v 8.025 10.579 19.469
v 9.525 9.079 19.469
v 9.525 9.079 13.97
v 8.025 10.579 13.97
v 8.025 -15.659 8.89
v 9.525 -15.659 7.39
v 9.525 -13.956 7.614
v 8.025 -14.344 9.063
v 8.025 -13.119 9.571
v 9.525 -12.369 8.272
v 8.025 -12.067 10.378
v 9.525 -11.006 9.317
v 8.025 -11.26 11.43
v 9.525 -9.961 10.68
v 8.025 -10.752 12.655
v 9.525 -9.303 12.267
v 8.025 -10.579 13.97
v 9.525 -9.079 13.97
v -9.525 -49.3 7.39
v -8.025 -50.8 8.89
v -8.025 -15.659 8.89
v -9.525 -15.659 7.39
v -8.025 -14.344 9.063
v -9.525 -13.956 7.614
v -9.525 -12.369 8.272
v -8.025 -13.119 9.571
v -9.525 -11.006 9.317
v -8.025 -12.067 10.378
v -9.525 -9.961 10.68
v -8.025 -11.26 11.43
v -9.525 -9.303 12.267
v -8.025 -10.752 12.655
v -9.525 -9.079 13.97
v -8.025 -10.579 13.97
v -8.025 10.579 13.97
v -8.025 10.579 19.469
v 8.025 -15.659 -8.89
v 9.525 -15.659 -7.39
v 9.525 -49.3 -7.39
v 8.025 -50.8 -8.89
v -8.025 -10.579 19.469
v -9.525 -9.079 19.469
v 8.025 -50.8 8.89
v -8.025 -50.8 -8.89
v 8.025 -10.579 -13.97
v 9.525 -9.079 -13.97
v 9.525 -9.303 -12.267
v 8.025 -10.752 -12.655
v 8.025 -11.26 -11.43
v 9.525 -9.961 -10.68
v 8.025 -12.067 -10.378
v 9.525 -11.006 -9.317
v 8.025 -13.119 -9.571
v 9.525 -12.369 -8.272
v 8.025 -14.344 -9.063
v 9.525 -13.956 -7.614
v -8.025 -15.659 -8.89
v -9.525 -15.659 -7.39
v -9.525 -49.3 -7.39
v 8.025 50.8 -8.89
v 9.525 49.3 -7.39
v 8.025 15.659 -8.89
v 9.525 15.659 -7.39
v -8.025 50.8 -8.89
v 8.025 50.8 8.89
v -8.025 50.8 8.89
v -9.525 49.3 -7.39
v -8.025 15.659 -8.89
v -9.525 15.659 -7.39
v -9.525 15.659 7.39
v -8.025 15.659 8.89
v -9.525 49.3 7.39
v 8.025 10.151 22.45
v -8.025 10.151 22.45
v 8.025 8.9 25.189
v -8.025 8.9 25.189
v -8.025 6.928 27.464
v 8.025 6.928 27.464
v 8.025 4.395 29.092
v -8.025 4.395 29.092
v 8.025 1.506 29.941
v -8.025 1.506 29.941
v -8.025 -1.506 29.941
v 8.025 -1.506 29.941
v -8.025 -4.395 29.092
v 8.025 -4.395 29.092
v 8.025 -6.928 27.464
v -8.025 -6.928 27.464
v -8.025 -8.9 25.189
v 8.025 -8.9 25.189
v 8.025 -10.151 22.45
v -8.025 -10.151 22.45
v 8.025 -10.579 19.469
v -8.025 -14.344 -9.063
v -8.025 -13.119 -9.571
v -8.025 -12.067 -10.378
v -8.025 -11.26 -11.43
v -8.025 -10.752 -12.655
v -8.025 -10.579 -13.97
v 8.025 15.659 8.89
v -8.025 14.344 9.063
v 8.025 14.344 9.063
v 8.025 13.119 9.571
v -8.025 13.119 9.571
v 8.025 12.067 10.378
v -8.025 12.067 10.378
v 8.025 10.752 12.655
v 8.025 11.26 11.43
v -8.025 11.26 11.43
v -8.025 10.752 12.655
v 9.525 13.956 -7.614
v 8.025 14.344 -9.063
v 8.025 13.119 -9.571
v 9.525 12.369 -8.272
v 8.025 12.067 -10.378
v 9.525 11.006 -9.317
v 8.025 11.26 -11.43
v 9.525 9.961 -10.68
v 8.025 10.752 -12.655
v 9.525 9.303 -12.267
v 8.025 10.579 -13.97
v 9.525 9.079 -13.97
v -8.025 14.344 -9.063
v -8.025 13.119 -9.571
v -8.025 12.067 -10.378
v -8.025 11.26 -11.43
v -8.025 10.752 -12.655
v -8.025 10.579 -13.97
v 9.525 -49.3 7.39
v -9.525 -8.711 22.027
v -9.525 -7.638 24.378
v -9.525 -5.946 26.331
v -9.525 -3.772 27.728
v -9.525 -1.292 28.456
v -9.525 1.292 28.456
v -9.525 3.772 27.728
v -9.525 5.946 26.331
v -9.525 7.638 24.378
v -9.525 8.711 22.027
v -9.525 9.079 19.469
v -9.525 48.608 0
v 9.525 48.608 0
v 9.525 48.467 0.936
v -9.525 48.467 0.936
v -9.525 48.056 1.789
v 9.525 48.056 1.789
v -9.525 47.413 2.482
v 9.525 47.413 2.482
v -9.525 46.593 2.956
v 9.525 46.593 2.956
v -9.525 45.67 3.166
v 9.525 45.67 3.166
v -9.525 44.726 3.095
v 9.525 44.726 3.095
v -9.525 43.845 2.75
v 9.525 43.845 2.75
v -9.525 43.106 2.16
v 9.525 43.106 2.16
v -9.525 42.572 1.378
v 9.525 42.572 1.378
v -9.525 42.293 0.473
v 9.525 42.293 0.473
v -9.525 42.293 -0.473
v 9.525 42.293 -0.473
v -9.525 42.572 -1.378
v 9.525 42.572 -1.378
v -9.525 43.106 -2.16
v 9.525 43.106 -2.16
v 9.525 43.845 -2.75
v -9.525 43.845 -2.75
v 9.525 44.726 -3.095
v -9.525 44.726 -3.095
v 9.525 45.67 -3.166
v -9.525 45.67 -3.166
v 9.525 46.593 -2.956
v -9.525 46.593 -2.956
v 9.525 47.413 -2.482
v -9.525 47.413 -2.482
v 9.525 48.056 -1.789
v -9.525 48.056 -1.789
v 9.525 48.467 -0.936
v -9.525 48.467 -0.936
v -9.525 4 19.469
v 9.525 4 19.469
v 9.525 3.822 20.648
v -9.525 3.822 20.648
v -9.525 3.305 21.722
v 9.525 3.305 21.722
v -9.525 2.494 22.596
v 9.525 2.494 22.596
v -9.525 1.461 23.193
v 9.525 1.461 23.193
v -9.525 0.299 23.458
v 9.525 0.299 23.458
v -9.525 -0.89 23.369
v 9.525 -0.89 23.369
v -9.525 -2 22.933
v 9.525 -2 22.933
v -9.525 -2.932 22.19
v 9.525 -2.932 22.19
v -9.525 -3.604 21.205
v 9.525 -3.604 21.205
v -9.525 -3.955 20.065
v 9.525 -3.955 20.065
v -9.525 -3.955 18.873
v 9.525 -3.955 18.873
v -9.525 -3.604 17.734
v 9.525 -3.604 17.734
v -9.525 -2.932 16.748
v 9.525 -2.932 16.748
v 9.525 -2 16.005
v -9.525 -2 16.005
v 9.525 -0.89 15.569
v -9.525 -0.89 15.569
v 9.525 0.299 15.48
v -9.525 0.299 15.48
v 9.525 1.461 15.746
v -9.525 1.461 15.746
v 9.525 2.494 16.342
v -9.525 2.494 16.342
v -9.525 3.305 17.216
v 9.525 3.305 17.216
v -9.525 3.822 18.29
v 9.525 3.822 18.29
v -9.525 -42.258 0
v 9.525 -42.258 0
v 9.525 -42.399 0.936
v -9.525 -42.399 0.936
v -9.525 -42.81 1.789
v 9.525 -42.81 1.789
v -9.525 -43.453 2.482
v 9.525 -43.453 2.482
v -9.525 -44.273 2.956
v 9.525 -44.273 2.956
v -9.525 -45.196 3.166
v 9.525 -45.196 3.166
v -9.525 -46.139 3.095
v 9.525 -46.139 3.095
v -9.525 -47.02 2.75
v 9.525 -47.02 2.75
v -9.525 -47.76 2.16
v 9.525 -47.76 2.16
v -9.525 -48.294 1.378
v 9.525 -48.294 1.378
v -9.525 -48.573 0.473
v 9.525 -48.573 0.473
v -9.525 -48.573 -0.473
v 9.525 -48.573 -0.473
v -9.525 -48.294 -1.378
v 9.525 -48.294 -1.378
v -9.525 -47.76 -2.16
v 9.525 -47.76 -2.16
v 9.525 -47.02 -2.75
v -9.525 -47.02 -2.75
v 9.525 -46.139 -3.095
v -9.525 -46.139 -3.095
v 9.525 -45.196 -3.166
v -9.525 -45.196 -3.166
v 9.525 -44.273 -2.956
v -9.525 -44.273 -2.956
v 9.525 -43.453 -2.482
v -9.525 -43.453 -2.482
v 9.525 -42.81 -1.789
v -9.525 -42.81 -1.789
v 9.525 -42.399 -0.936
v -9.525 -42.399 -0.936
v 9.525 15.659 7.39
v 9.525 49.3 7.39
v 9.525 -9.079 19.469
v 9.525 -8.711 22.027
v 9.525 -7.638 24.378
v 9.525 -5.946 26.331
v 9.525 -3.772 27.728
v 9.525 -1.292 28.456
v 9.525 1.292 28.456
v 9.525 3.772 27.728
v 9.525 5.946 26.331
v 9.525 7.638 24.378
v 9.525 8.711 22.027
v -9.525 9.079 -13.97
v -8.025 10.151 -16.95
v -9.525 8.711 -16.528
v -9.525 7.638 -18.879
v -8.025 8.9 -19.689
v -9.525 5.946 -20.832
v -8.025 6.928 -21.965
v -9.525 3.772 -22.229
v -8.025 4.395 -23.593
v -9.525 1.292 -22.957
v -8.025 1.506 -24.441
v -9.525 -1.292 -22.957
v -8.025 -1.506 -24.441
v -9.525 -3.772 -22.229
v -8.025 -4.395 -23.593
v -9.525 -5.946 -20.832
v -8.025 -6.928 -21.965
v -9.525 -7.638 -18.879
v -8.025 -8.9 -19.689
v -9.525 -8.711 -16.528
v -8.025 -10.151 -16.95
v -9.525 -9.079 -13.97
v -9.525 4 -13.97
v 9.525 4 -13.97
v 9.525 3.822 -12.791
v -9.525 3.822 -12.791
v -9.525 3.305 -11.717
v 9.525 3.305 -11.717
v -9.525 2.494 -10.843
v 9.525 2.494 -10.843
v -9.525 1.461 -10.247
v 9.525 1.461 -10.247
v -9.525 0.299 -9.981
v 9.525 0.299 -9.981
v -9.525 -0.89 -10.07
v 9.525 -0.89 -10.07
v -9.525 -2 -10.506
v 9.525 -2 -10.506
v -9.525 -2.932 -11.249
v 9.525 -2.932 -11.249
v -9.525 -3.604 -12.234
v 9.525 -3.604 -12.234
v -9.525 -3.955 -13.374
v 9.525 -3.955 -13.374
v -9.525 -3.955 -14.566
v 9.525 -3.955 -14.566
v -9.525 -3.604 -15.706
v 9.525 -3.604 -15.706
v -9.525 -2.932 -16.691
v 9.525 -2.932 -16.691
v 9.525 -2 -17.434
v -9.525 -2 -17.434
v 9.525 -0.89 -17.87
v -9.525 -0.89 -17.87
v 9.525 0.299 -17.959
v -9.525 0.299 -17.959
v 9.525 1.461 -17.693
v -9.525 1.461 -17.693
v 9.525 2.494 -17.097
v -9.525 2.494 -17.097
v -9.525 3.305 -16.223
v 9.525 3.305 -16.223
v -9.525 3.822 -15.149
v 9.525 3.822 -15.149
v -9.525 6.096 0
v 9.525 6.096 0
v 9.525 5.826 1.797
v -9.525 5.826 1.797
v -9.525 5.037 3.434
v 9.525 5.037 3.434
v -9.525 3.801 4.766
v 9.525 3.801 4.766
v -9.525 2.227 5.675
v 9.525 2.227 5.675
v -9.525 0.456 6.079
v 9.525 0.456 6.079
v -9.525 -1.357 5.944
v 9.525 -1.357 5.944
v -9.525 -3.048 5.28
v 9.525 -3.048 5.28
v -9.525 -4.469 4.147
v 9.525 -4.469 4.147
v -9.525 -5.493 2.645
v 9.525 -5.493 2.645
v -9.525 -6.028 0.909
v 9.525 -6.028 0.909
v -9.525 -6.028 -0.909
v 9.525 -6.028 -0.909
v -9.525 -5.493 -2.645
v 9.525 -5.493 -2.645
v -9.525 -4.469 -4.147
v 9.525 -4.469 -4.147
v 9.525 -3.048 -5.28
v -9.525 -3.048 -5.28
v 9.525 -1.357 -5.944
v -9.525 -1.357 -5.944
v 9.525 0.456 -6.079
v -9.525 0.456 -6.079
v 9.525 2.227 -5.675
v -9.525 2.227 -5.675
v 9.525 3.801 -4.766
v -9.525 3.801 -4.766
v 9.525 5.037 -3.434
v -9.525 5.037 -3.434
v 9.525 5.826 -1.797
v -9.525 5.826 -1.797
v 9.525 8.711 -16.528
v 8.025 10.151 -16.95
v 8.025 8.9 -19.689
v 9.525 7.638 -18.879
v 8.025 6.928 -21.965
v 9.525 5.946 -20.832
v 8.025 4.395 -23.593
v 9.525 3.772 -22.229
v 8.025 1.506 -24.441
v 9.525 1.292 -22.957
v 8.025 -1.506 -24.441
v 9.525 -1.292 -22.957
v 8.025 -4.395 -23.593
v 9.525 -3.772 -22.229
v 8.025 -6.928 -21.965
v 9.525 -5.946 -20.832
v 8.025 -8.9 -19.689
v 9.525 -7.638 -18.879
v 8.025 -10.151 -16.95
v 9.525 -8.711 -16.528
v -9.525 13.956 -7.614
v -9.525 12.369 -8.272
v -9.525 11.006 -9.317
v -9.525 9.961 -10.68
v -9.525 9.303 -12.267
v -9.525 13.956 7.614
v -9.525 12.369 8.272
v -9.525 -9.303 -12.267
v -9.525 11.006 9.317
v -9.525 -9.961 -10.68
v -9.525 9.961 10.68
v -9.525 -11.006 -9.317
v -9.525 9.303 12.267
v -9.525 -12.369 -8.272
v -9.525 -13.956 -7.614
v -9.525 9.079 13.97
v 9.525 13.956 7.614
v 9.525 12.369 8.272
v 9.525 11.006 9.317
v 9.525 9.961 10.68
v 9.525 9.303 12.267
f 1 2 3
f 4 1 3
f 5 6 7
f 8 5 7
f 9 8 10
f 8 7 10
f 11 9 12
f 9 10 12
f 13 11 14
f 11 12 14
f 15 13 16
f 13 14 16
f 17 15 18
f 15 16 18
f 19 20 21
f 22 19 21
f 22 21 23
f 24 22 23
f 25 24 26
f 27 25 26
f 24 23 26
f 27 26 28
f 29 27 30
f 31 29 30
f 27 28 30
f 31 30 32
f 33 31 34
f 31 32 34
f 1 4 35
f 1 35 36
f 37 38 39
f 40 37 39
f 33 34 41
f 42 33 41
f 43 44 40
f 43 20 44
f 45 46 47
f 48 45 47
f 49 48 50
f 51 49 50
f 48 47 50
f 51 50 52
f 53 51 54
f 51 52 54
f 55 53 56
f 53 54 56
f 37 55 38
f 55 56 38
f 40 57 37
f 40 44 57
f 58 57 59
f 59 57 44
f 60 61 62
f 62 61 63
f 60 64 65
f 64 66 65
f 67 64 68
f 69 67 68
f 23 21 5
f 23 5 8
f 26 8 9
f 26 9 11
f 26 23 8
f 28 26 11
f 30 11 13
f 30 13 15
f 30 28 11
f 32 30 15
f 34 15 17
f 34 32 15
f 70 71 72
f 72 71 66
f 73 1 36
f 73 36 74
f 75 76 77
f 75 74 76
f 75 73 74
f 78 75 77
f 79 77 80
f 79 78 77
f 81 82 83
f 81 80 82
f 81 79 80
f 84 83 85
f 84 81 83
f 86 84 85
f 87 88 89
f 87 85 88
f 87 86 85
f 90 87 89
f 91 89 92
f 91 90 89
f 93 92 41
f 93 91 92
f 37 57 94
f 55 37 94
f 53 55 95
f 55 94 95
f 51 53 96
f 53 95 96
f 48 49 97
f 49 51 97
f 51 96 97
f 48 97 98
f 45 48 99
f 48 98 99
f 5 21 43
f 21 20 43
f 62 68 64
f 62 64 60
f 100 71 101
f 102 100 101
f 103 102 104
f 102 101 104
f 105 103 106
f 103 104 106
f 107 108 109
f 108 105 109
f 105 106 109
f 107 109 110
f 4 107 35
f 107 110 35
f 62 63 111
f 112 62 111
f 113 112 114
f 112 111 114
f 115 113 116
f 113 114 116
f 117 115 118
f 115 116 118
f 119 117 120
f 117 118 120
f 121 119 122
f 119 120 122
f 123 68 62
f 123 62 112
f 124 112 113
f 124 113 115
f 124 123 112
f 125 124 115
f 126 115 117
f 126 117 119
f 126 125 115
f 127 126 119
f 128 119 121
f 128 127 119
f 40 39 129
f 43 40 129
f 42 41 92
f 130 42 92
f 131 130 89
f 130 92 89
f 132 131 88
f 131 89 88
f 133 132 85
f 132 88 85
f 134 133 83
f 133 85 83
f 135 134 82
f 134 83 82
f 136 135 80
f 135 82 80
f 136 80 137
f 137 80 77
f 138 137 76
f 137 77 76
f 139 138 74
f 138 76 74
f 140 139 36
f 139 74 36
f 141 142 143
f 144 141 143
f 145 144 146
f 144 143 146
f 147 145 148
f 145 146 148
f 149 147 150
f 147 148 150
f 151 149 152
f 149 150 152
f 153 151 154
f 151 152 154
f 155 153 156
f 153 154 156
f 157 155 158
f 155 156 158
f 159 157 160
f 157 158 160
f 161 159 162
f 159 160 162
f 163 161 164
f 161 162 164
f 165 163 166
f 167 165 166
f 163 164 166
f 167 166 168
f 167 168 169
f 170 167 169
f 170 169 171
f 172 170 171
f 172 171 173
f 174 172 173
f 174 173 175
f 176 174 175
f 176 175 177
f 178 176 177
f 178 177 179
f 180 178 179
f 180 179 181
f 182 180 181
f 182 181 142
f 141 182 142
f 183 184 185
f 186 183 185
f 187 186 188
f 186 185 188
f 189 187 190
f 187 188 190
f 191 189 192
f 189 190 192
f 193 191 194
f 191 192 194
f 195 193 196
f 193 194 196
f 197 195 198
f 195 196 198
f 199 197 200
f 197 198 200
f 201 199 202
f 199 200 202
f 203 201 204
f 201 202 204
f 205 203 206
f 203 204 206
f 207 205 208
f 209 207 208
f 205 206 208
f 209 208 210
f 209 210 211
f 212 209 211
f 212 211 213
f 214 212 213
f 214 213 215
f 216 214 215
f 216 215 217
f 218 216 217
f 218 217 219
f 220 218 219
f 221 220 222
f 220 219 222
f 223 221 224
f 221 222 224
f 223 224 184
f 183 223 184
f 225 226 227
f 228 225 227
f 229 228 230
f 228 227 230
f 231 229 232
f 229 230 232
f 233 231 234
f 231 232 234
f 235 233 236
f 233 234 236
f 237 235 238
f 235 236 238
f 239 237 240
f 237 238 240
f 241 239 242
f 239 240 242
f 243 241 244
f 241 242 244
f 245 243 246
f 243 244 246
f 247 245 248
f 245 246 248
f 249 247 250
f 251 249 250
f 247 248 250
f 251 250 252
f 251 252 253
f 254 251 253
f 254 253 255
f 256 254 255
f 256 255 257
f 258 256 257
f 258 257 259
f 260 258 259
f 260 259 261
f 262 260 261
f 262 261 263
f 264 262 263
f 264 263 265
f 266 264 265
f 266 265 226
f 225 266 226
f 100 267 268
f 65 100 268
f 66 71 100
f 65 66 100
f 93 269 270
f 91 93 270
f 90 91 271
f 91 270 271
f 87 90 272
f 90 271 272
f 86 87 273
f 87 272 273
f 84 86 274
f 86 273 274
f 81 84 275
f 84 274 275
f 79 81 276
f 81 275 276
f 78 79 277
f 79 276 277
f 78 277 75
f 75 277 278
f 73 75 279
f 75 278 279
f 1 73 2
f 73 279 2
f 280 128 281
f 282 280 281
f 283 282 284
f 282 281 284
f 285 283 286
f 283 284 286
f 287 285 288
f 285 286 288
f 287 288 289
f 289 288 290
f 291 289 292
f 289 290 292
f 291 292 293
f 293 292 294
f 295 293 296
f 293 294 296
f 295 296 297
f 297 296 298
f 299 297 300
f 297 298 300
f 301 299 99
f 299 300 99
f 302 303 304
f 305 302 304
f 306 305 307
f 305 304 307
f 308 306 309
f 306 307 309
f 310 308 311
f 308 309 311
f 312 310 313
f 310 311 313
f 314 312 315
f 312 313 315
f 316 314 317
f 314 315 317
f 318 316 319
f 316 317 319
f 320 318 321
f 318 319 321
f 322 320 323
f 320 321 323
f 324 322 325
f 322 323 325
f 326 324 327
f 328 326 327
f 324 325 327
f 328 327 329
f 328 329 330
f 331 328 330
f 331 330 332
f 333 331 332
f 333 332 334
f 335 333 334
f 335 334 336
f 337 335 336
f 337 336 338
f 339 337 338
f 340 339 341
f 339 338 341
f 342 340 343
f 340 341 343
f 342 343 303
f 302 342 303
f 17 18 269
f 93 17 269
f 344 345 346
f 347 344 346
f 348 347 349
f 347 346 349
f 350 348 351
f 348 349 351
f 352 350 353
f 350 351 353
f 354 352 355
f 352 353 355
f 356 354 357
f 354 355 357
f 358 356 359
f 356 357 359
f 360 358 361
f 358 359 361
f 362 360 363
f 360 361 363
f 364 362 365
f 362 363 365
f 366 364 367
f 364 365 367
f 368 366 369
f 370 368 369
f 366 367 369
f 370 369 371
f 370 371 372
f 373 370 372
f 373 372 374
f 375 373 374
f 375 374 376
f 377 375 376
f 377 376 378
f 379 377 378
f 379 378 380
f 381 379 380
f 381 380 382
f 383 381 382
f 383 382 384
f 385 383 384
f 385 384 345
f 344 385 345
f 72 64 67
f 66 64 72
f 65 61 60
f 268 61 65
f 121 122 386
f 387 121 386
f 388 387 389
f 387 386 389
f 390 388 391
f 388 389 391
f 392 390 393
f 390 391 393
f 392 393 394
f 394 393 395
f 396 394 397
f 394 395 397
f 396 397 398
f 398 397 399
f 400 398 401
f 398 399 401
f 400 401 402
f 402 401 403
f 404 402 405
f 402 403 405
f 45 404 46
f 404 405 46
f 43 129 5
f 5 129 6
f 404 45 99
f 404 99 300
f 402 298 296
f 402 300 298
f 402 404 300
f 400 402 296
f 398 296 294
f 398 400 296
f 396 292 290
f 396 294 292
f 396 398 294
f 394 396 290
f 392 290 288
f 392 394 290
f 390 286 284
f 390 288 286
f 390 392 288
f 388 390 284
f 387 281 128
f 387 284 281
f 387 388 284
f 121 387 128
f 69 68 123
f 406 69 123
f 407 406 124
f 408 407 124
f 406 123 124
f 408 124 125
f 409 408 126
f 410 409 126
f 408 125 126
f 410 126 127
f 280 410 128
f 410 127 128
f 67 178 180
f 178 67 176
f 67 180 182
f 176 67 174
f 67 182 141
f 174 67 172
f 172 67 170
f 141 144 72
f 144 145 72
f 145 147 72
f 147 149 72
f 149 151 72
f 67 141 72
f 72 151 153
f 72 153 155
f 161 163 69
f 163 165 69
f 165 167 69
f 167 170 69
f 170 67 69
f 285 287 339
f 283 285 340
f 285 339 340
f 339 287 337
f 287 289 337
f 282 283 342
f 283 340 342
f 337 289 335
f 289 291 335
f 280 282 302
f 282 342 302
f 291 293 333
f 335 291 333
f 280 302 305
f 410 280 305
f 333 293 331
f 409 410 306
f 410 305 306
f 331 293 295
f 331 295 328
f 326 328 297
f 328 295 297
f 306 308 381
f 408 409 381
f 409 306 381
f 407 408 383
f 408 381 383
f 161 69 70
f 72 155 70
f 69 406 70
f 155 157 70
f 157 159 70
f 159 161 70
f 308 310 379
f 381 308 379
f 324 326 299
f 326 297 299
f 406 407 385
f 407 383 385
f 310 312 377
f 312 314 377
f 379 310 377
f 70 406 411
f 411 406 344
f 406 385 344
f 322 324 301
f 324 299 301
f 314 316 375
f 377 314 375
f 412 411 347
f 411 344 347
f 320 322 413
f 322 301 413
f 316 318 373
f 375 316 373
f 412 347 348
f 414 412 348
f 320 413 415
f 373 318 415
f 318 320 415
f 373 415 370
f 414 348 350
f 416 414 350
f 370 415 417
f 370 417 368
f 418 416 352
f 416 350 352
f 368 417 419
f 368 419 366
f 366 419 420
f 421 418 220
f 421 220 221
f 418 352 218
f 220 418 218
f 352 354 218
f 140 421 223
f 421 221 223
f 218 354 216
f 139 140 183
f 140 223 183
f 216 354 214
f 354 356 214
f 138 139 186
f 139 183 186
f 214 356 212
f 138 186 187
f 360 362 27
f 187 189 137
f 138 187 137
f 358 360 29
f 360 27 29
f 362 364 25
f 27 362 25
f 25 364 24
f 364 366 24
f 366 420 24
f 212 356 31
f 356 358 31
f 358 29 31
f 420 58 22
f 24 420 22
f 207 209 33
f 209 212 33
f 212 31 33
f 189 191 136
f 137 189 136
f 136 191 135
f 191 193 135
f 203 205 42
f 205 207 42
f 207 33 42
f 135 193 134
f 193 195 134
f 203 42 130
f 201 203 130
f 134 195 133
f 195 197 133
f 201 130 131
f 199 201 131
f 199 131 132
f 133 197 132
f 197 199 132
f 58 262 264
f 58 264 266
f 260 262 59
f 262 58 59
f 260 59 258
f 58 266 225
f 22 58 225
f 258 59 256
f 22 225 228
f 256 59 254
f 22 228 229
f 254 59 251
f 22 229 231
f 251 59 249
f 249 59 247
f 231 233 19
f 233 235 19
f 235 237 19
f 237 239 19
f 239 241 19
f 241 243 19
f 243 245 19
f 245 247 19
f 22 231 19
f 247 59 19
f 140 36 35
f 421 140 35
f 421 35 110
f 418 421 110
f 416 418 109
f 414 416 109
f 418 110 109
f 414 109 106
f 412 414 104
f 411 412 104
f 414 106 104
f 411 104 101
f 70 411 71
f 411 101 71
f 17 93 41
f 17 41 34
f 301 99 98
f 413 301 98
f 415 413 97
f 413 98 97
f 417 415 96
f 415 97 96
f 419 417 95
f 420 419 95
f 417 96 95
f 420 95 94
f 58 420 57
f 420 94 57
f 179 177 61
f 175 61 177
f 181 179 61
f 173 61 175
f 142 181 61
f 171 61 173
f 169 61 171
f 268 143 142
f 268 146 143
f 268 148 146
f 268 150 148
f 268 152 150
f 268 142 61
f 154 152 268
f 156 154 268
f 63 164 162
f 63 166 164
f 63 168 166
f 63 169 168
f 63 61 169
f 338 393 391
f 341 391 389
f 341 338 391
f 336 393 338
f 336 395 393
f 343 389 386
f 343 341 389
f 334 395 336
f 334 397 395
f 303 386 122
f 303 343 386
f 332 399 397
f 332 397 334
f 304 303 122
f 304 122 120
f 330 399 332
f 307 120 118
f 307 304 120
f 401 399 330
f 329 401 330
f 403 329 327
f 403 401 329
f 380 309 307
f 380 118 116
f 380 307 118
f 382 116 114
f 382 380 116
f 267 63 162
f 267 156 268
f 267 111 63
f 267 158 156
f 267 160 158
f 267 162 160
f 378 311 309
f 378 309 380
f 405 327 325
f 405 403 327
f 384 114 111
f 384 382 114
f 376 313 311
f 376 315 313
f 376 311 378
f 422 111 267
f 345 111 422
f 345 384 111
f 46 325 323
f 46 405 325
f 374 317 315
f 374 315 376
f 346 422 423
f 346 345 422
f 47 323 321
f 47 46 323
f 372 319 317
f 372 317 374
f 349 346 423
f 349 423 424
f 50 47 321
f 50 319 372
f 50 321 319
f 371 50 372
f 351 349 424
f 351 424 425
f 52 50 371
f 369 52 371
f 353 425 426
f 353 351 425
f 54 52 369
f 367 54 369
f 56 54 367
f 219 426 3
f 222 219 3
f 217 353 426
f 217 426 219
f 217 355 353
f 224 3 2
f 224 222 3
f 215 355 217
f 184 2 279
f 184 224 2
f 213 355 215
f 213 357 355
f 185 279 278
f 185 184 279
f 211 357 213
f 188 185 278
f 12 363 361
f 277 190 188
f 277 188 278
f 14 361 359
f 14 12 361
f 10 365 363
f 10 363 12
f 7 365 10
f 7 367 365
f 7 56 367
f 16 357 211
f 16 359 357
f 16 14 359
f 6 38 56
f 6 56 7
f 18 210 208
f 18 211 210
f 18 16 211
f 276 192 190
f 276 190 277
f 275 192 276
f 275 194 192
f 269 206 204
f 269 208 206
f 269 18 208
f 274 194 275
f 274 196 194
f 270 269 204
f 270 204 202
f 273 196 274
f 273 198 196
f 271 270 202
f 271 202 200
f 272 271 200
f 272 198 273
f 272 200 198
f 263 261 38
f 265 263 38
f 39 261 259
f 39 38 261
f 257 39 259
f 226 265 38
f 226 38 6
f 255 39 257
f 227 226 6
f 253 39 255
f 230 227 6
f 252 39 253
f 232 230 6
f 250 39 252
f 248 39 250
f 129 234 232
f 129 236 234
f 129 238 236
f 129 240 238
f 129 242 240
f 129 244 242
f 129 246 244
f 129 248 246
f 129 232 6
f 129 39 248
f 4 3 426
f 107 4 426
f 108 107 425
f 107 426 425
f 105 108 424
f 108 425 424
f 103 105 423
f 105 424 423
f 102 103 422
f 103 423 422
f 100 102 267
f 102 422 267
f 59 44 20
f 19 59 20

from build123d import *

# Parameters (mm, degrees)
F0_W     = 19.05
F0_H     = 17.78
F1_DEPTH = 50.8
F2_R     = 3.175
F2_R_2   = 6.0964456607
F3_DEPTH = 19.051
F4_R     = 4
F5_DEPTH = 19.05
F6_R     = 5.07999
F7_SIZE  = 1.5


# Not quite as in the source:
# - a fillet or chamfer is up to 0.001 mm smaller than in the source, because OpenCascade refuses the exact size


with BuildPart() as f1:
    # F0 (on Front) → F1 (new body, symmetric)
    with BuildSketch(Plane.XZ):
        Rectangle(F0_W, F0_H)
    extrude(amount=F1_DEPTH, both=True)

    # F2 (on face) → F3 (cut, through all)
    with BuildSketch(Plane.YZ.offset(9.525)):
        with Locations((-45.43298, 0)):
            Circle(F2_R)
        with Locations((45.43298, 0)):
            Circle(F2_R)
        Circle(F2_R_2)
    extrude(amount=-F3_DEPTH, mode=Mode.SUBTRACT)

    # F4 (on face) → F5 (join, through all)
    with BuildSketch(Plane.YZ.offset(9.525)):
        with BuildLine():
            Line((-10.5791, 19.4691), (-10.5791, 8.89))
            Line((-10.5791, 8.89), (10.5791, 8.89))
            Line((10.5791, 8.89), (10.5791, 19.4691))
            ThreePointArc((10.5791, 19.4691), (0, 30.0482), (-10.5791, 19.4691))
        make_face()
        with Locations((0, 19.4691)):
            Circle(F4_R, mode=Mode.SUBTRACT)
        with BuildLine():
            Line((-10.5791, -8.89), (-10.5791, -13.97))
            ThreePointArc((-10.5791, -13.97), (0, -24.5491), (10.5791, -13.97))
            Line((10.5791, -13.97), (10.5791, -8.89))
            Line((10.5791, -8.89), (-10.5791, -8.89))
        make_face()
        with Locations((0, -13.97)):
            Circle(F4_R, mode=Mode.SUBTRACT)
    extrude(amount=-F5_DEPTH)

    # F6 (radius 5.08 in the source; OpenCascade refuses exactly that, so slightly less here)
    f6_edges = [f1.edges().sort_by_distance(p)[0] for p in [
        (0, -10.5791, 8.89),
        (0, 10.5791, 8.89),
        (0, -10.5791, -8.89),
        (0, 10.5791, -8.89),
    ]]
    fillet(f6_edges, radius=F6_R)

    # F7
    f7_edges = [f1.edges().sort_by_distance(p)[0] for p in [
        (9.525, -33.229545, 8.89),
        (9.525, -33.229545, -8.89),
        (-9.525, -33.229545, 8.89),
        (-9.525, -33.229545, -8.89),
        (-9.525, -50.8, 0),
        (-9.525, 50.8, 0),
        (9.525, -50.8, 0),
        (9.525, 50.8, 0),
    ]]
    chamfer(f7_edges, length=F7_SIZE)


solid = f1.part
